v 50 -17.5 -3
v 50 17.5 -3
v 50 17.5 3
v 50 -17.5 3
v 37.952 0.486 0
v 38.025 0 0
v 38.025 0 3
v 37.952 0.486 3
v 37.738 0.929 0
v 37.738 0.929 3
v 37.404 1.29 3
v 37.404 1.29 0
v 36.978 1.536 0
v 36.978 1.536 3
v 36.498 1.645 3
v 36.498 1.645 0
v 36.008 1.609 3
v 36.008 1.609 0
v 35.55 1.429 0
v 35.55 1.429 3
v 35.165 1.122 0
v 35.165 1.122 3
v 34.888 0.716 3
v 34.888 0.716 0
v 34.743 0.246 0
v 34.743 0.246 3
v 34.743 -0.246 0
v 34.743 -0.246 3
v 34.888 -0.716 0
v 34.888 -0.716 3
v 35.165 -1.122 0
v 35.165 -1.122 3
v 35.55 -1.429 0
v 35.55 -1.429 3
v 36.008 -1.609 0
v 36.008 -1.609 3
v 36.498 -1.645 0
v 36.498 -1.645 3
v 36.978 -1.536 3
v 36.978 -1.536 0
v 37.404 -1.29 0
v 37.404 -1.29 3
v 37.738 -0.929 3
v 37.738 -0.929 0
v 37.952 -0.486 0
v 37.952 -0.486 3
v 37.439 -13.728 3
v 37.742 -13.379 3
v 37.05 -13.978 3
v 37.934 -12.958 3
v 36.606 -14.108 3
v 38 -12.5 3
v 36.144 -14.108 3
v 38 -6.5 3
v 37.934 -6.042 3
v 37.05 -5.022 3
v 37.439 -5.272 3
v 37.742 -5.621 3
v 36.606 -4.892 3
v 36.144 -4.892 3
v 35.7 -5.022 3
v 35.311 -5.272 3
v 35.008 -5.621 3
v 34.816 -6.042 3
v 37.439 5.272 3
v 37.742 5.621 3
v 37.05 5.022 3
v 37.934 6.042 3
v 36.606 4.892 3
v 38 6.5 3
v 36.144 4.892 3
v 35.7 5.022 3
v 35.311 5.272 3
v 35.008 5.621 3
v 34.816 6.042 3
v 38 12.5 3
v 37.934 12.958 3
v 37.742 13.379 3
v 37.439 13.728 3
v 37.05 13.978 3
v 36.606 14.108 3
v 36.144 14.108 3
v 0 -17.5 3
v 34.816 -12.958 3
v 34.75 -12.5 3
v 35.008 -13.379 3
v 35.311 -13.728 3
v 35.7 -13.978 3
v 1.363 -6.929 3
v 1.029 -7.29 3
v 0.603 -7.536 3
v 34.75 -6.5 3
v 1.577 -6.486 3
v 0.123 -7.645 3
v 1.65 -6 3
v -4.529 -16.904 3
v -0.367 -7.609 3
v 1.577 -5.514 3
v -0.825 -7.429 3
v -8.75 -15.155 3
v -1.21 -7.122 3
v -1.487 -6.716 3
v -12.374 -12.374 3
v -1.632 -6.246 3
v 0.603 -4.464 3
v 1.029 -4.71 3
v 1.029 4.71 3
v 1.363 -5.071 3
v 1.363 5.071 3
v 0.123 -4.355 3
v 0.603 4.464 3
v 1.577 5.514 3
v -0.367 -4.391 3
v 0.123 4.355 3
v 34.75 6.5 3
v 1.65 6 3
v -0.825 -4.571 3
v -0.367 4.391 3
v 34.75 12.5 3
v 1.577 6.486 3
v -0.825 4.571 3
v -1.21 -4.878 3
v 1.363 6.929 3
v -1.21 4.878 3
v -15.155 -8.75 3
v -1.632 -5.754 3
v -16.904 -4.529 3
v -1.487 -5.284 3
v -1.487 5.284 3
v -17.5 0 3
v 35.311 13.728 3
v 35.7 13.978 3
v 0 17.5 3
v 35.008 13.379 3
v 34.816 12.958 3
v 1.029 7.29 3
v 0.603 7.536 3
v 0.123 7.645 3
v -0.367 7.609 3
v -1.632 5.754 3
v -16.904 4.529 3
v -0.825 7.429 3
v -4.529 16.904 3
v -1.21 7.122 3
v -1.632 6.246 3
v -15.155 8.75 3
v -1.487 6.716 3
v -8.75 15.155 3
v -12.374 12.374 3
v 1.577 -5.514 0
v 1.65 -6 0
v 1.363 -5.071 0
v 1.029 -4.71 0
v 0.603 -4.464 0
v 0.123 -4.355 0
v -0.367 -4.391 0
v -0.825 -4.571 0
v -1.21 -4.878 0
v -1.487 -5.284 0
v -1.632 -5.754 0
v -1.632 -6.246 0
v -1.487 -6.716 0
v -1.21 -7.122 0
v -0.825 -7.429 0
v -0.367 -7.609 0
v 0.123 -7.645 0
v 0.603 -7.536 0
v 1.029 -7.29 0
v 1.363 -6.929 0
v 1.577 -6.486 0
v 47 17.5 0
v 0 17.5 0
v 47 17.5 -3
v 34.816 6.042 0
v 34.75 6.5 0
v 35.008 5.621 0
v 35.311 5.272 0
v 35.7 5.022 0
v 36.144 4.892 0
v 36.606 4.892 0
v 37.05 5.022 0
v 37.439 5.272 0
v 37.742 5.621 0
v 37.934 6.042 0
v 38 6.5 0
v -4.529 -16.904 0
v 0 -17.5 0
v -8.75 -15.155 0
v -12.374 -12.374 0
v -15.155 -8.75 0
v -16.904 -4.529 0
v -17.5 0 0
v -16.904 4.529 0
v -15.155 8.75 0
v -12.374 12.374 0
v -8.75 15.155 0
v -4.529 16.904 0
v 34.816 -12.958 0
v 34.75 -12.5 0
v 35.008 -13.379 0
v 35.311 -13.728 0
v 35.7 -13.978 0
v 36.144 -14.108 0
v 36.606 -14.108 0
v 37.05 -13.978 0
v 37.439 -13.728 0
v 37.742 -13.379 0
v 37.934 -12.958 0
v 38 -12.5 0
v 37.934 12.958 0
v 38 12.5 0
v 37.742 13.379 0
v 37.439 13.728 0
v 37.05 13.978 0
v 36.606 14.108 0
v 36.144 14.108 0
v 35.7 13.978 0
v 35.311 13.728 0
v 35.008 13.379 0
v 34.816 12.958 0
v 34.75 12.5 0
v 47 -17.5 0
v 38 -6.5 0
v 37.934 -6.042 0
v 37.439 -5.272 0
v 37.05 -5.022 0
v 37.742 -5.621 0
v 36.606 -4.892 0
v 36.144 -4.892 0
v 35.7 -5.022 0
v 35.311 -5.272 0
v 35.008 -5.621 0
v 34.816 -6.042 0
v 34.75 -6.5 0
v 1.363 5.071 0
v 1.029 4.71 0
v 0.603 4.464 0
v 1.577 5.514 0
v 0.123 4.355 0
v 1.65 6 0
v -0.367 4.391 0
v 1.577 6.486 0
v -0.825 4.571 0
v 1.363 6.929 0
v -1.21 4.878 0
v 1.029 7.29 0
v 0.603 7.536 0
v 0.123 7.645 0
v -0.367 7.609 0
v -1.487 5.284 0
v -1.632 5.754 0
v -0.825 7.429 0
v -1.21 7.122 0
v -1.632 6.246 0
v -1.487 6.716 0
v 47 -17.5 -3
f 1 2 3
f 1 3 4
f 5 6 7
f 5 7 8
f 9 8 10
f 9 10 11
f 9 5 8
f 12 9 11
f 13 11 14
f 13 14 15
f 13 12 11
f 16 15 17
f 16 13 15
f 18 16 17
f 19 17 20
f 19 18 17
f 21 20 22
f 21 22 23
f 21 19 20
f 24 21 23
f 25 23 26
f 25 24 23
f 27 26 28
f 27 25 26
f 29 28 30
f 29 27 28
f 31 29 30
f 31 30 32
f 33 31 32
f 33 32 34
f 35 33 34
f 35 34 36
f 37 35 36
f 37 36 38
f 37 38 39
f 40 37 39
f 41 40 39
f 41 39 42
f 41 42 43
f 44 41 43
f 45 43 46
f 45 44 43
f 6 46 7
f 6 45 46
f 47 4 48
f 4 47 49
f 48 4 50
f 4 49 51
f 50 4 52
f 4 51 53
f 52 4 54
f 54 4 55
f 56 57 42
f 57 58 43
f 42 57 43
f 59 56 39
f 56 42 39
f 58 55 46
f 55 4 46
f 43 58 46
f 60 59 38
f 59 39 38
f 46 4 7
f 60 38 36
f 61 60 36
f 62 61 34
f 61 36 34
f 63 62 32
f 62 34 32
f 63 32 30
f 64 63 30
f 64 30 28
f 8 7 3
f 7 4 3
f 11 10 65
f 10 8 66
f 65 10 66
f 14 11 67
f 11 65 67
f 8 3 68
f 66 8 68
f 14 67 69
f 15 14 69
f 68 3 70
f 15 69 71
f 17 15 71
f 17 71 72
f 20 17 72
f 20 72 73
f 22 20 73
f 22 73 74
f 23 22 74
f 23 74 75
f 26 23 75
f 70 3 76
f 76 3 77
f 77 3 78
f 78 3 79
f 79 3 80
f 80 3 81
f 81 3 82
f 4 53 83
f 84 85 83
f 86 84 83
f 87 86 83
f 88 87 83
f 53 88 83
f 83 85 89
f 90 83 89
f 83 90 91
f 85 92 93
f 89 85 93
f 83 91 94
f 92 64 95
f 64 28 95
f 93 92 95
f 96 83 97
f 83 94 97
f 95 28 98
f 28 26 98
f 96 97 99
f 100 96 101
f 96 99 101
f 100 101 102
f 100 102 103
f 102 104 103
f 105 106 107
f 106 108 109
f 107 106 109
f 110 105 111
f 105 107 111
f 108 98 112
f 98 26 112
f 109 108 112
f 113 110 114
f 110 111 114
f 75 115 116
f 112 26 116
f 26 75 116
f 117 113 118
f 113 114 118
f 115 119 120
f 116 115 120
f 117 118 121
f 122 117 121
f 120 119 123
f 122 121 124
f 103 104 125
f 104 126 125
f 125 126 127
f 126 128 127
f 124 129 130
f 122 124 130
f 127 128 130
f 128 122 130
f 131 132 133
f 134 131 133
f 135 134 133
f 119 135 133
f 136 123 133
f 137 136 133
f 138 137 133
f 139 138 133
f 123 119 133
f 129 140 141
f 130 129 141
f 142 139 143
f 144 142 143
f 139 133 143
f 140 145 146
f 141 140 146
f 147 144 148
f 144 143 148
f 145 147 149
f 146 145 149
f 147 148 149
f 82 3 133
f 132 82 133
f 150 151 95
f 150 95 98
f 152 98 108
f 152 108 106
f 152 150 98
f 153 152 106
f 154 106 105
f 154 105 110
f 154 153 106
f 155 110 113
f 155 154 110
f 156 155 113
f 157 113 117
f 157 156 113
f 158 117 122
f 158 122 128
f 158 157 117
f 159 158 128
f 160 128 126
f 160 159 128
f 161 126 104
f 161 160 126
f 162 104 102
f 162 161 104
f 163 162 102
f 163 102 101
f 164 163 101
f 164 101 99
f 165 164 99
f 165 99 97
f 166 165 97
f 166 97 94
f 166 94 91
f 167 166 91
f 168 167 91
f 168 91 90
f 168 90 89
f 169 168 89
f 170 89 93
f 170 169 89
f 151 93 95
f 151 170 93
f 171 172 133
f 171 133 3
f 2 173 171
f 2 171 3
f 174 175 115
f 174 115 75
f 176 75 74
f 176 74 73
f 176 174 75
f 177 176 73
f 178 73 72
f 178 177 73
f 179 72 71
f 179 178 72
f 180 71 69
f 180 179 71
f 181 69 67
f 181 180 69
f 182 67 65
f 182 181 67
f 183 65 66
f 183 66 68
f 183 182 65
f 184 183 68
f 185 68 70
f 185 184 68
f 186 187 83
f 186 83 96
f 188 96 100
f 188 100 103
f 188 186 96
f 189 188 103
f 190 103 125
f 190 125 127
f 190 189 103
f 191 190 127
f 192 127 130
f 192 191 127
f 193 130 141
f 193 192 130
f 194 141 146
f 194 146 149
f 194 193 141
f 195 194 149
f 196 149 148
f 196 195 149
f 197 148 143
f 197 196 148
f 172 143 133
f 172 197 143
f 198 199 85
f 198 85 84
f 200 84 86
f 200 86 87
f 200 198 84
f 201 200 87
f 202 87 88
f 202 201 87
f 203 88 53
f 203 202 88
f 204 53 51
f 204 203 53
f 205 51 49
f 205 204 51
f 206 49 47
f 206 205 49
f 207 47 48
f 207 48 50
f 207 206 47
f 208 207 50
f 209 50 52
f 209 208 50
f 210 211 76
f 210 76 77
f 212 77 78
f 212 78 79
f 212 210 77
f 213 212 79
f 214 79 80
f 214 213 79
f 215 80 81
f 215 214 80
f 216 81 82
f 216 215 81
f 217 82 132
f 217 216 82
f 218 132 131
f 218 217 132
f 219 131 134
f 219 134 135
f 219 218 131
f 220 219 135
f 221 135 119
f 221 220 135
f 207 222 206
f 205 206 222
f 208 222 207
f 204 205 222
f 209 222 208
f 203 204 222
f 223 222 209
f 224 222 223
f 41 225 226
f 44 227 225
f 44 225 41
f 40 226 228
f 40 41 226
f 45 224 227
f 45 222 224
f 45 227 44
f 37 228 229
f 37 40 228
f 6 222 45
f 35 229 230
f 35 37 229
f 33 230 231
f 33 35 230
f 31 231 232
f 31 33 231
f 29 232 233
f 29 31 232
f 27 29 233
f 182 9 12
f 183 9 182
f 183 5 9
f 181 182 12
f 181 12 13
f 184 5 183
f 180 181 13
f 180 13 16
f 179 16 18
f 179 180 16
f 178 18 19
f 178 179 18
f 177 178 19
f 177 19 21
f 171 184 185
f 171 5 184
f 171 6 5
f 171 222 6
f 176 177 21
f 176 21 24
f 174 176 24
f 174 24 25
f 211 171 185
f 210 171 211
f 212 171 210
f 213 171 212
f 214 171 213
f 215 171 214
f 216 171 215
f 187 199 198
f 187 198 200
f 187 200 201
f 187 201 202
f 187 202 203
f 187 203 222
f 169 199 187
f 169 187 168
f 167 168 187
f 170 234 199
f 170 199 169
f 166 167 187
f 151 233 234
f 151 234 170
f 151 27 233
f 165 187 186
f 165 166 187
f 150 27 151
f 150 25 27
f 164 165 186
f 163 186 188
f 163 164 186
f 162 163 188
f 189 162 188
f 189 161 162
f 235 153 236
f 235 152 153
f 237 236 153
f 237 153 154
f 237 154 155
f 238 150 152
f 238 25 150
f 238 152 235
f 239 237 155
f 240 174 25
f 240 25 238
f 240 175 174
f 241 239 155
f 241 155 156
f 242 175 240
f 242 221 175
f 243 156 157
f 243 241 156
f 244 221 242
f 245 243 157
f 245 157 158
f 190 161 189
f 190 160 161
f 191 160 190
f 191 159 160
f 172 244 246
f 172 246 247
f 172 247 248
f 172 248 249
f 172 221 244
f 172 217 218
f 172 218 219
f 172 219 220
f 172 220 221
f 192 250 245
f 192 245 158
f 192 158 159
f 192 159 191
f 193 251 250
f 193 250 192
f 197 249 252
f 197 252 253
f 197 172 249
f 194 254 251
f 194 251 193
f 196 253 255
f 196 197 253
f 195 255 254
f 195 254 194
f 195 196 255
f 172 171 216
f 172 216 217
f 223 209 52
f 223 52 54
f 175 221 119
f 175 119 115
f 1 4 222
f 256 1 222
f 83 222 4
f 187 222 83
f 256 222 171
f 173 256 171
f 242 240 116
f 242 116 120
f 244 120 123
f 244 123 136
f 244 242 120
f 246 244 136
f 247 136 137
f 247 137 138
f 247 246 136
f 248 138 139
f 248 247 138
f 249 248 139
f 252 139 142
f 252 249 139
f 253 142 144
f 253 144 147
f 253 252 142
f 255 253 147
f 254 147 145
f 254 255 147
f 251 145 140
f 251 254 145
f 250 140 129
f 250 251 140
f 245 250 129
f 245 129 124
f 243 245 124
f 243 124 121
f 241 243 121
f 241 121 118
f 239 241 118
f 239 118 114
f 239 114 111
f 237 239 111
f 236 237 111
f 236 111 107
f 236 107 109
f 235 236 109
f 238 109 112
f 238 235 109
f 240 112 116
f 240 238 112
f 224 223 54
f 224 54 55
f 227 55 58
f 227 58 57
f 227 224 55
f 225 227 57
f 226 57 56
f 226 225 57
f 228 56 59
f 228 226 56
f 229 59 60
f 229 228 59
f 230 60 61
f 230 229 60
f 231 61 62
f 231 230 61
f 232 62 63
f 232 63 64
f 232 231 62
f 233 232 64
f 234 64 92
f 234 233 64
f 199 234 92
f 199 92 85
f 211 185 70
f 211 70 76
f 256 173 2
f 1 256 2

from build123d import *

# Parameters (mm, degrees)
SKETCH_1_R      = 1.65
EXTRUDE_1_DEPTH = 3
SKETCH_2_W      = 3
SKETCH_2_H      = 35
EXTRUDE_2_DEPTH = 6


with BuildPart() as part:
    # 草图1 → 凸台-拉伸1 (new body)
    with BuildSketch(Plane.XY):
        with BuildLine():
            Line((0, 17.5), (50, 17.5))
            Line((50, 17.5), (50, -17.5))
            Line((50, -17.5), (0, -17.5))
            ThreePointArc((0, -17.5), (-17.5, 0), (0, 17.5))
        make_face()
        with Locations((36.375, 0)):
            Circle(SKETCH_1_R, mode=Mode.SUBTRACT)
        with Locations((0, 6)):
            Circle(SKETCH_1_R, mode=Mode.SUBTRACT)
        with Locations((0, -6)):
            Circle(SKETCH_1_R, mode=Mode.SUBTRACT)
        with BuildLine():
            Line((34.75, 12.5), (34.75, 6.5))
            ThreePointArc((34.75, 6.5), (36.375, 4.875), (38, 6.5))
            Line((38, 6.5), (38, 12.5))
            ThreePointArc((38, 12.5), (36.375, 14.125), (34.75, 12.5))
        make_face(mode=Mode.SUBTRACT)
        with BuildLine():
            Line((34.75, -6.5), (34.75, -12.5))
            ThreePointArc((34.75, -12.5), (36.375, -14.125), (38, -12.5))
            Line((38, -12.5), (38, -6.5))
            ThreePointArc((38, -6.5), (36.375, -4.875), (34.75, -6.5))
        make_face(mode=Mode.SUBTRACT)
    extrude(amount=EXTRUDE_1_DEPTH)

    # 草图2 → 凸台-拉伸2 (add)
    with BuildSketch(Plane.XY.offset(3)):
        with Locations((48.5, 0)):
            Rectangle(SKETCH_2_W, SKETCH_2_H)
    extrude(amount=-EXTRUDE_2_DEPTH)


solid = part.part
